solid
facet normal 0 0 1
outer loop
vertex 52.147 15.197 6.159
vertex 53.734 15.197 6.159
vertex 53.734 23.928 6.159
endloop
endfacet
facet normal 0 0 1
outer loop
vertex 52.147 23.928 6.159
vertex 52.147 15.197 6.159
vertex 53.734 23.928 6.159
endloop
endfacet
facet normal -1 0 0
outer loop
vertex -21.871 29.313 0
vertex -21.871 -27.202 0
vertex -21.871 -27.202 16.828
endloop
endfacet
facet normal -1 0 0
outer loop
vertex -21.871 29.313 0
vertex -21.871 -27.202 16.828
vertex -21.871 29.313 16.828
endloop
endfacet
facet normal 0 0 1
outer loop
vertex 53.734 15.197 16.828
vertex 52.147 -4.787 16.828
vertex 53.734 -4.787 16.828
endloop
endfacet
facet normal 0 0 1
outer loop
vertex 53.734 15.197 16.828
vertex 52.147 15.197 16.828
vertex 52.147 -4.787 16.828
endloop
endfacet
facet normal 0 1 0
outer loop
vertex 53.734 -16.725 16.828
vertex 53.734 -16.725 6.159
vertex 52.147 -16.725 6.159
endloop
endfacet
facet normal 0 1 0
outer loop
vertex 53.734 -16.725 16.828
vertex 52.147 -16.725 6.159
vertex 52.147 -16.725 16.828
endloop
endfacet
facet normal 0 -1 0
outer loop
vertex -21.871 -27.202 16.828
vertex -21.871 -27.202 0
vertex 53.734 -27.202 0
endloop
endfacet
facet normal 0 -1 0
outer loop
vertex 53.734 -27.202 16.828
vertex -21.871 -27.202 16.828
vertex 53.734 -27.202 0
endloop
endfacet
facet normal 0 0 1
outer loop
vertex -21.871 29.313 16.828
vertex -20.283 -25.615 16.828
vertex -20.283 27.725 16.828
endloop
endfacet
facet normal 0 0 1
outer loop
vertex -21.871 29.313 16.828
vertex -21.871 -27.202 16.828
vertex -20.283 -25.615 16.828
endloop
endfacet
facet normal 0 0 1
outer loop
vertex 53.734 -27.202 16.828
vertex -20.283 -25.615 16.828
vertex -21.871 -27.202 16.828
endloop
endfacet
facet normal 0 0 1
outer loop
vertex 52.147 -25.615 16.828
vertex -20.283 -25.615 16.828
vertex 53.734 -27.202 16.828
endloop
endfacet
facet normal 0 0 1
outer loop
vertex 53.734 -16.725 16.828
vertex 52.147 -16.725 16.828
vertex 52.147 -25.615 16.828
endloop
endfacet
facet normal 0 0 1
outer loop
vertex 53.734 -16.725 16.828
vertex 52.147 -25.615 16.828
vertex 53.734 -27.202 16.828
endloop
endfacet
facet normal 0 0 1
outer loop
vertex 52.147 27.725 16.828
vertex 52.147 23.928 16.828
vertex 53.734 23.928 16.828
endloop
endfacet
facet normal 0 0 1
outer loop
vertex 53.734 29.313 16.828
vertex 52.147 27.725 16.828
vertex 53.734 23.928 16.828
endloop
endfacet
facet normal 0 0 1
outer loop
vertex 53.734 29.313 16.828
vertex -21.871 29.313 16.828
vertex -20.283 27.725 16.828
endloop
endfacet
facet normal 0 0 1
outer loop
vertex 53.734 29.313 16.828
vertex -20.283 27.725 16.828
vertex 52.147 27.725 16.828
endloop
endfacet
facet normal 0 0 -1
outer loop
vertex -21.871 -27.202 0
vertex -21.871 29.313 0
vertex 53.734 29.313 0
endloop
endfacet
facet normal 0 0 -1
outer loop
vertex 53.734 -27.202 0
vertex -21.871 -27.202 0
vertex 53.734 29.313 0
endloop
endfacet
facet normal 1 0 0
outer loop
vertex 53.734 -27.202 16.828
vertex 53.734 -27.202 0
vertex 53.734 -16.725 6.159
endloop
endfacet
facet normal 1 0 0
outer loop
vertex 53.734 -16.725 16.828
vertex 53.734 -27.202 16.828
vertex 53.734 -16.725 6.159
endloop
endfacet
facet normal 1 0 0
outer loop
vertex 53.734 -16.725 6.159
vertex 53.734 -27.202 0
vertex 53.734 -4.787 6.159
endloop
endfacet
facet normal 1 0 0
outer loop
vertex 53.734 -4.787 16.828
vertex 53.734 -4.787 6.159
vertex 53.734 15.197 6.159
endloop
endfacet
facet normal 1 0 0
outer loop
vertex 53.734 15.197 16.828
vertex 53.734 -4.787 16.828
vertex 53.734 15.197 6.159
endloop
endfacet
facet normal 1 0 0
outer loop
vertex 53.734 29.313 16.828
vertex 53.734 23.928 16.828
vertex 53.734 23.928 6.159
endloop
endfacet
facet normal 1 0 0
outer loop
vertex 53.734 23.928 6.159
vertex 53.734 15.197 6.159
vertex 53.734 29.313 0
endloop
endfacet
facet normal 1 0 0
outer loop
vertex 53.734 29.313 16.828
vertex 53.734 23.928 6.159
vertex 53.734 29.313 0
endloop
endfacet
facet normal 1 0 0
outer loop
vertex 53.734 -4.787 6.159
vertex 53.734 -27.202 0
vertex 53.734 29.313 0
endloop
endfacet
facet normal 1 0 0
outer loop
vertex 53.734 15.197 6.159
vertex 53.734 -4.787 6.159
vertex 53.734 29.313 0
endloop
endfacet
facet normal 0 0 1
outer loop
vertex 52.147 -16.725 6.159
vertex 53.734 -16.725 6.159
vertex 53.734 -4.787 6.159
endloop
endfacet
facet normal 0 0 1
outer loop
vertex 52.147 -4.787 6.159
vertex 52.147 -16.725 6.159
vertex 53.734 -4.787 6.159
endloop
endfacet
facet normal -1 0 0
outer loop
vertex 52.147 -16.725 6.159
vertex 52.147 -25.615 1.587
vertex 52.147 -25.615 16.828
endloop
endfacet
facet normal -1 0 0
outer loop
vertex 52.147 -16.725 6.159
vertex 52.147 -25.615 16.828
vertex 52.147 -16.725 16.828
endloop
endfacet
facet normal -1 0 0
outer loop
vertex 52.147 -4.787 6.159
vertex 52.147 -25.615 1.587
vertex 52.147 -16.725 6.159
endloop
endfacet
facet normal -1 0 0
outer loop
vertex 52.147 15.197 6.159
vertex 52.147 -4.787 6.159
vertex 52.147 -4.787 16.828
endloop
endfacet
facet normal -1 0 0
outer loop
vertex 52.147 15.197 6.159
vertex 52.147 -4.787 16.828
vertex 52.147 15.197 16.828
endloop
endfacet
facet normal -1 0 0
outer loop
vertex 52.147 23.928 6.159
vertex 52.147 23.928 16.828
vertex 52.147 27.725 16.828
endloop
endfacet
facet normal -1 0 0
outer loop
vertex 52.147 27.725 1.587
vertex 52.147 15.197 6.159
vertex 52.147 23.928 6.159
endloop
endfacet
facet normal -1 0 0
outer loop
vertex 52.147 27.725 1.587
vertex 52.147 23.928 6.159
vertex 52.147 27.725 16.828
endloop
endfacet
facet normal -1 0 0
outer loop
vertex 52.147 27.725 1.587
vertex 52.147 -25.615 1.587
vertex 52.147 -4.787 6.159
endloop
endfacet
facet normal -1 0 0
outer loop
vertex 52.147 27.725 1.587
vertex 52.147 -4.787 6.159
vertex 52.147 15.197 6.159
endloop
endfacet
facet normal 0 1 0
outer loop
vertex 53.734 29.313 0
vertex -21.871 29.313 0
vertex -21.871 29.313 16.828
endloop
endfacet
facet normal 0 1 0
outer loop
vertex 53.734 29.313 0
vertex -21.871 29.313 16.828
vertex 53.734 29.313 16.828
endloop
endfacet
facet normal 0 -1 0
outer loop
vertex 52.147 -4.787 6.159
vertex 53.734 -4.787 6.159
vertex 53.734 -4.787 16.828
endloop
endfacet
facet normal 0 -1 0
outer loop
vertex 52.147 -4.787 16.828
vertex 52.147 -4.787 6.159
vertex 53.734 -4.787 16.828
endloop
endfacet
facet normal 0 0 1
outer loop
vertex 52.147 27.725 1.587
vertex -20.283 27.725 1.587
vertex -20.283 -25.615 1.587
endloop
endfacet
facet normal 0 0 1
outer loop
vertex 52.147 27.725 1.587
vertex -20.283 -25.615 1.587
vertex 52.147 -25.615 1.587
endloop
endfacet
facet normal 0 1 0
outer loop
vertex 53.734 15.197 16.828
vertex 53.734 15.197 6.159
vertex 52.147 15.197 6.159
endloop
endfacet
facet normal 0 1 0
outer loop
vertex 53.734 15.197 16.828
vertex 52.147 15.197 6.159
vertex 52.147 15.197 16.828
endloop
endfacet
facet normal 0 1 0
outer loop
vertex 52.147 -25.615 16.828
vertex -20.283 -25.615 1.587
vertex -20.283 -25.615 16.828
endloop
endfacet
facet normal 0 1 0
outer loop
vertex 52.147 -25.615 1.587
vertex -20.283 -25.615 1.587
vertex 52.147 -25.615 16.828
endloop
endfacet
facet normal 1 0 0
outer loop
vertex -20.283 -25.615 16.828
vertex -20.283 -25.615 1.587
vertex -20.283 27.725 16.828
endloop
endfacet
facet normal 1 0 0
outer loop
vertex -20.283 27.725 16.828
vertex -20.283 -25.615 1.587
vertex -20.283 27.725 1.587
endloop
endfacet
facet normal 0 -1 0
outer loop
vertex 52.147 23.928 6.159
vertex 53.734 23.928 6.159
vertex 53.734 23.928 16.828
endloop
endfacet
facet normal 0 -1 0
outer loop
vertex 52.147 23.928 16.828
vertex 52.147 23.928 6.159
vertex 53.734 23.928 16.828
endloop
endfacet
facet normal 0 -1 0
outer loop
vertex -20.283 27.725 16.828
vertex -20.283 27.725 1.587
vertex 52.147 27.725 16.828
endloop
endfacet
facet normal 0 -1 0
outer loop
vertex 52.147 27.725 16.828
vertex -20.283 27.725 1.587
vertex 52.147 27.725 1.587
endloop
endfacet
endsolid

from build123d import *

# Parameters (mm, degrees)
F0_W     = 75.605
F0_H     = 56.515
F1_DEPTH = 16.8275
F2_T     = -1.5875
F3_W     = 11.938
F3_H     = 10.668
F3_W_2   = 8.73125
F4_DEPTH = 1.5875


with BuildPart() as f1:
    # F0 (on Top) → F1 (new body)
    with BuildSketch(Plane.XY):
        with Locations((15.93168, 1.055113)):
            Rectangle(F0_W, F0_H)
    extrude(amount=F1_DEPTH)

    # F2
    f2_openings = [f1.faces().sort_by_distance(p)[0] for p in [
        (15.93168, 1.055113, 16.8275),
    ]]
    offset(amount=F2_T, openings=f2_openings)

    # F3 (on face) → F4 (cut)
    with BuildSketch(Plane.YZ.offset(53.73418)):
        with Locations((-10.755887, 11.4935)):
            Rectangle(F3_W, F3_H)
        with Locations((19.562188, 11.4935)):
            Rectangle(F3_W_2, F3_H)
    extrude(amount=-F4_DEPTH, mode=Mode.SUBTRACT)


solid = f1.part
